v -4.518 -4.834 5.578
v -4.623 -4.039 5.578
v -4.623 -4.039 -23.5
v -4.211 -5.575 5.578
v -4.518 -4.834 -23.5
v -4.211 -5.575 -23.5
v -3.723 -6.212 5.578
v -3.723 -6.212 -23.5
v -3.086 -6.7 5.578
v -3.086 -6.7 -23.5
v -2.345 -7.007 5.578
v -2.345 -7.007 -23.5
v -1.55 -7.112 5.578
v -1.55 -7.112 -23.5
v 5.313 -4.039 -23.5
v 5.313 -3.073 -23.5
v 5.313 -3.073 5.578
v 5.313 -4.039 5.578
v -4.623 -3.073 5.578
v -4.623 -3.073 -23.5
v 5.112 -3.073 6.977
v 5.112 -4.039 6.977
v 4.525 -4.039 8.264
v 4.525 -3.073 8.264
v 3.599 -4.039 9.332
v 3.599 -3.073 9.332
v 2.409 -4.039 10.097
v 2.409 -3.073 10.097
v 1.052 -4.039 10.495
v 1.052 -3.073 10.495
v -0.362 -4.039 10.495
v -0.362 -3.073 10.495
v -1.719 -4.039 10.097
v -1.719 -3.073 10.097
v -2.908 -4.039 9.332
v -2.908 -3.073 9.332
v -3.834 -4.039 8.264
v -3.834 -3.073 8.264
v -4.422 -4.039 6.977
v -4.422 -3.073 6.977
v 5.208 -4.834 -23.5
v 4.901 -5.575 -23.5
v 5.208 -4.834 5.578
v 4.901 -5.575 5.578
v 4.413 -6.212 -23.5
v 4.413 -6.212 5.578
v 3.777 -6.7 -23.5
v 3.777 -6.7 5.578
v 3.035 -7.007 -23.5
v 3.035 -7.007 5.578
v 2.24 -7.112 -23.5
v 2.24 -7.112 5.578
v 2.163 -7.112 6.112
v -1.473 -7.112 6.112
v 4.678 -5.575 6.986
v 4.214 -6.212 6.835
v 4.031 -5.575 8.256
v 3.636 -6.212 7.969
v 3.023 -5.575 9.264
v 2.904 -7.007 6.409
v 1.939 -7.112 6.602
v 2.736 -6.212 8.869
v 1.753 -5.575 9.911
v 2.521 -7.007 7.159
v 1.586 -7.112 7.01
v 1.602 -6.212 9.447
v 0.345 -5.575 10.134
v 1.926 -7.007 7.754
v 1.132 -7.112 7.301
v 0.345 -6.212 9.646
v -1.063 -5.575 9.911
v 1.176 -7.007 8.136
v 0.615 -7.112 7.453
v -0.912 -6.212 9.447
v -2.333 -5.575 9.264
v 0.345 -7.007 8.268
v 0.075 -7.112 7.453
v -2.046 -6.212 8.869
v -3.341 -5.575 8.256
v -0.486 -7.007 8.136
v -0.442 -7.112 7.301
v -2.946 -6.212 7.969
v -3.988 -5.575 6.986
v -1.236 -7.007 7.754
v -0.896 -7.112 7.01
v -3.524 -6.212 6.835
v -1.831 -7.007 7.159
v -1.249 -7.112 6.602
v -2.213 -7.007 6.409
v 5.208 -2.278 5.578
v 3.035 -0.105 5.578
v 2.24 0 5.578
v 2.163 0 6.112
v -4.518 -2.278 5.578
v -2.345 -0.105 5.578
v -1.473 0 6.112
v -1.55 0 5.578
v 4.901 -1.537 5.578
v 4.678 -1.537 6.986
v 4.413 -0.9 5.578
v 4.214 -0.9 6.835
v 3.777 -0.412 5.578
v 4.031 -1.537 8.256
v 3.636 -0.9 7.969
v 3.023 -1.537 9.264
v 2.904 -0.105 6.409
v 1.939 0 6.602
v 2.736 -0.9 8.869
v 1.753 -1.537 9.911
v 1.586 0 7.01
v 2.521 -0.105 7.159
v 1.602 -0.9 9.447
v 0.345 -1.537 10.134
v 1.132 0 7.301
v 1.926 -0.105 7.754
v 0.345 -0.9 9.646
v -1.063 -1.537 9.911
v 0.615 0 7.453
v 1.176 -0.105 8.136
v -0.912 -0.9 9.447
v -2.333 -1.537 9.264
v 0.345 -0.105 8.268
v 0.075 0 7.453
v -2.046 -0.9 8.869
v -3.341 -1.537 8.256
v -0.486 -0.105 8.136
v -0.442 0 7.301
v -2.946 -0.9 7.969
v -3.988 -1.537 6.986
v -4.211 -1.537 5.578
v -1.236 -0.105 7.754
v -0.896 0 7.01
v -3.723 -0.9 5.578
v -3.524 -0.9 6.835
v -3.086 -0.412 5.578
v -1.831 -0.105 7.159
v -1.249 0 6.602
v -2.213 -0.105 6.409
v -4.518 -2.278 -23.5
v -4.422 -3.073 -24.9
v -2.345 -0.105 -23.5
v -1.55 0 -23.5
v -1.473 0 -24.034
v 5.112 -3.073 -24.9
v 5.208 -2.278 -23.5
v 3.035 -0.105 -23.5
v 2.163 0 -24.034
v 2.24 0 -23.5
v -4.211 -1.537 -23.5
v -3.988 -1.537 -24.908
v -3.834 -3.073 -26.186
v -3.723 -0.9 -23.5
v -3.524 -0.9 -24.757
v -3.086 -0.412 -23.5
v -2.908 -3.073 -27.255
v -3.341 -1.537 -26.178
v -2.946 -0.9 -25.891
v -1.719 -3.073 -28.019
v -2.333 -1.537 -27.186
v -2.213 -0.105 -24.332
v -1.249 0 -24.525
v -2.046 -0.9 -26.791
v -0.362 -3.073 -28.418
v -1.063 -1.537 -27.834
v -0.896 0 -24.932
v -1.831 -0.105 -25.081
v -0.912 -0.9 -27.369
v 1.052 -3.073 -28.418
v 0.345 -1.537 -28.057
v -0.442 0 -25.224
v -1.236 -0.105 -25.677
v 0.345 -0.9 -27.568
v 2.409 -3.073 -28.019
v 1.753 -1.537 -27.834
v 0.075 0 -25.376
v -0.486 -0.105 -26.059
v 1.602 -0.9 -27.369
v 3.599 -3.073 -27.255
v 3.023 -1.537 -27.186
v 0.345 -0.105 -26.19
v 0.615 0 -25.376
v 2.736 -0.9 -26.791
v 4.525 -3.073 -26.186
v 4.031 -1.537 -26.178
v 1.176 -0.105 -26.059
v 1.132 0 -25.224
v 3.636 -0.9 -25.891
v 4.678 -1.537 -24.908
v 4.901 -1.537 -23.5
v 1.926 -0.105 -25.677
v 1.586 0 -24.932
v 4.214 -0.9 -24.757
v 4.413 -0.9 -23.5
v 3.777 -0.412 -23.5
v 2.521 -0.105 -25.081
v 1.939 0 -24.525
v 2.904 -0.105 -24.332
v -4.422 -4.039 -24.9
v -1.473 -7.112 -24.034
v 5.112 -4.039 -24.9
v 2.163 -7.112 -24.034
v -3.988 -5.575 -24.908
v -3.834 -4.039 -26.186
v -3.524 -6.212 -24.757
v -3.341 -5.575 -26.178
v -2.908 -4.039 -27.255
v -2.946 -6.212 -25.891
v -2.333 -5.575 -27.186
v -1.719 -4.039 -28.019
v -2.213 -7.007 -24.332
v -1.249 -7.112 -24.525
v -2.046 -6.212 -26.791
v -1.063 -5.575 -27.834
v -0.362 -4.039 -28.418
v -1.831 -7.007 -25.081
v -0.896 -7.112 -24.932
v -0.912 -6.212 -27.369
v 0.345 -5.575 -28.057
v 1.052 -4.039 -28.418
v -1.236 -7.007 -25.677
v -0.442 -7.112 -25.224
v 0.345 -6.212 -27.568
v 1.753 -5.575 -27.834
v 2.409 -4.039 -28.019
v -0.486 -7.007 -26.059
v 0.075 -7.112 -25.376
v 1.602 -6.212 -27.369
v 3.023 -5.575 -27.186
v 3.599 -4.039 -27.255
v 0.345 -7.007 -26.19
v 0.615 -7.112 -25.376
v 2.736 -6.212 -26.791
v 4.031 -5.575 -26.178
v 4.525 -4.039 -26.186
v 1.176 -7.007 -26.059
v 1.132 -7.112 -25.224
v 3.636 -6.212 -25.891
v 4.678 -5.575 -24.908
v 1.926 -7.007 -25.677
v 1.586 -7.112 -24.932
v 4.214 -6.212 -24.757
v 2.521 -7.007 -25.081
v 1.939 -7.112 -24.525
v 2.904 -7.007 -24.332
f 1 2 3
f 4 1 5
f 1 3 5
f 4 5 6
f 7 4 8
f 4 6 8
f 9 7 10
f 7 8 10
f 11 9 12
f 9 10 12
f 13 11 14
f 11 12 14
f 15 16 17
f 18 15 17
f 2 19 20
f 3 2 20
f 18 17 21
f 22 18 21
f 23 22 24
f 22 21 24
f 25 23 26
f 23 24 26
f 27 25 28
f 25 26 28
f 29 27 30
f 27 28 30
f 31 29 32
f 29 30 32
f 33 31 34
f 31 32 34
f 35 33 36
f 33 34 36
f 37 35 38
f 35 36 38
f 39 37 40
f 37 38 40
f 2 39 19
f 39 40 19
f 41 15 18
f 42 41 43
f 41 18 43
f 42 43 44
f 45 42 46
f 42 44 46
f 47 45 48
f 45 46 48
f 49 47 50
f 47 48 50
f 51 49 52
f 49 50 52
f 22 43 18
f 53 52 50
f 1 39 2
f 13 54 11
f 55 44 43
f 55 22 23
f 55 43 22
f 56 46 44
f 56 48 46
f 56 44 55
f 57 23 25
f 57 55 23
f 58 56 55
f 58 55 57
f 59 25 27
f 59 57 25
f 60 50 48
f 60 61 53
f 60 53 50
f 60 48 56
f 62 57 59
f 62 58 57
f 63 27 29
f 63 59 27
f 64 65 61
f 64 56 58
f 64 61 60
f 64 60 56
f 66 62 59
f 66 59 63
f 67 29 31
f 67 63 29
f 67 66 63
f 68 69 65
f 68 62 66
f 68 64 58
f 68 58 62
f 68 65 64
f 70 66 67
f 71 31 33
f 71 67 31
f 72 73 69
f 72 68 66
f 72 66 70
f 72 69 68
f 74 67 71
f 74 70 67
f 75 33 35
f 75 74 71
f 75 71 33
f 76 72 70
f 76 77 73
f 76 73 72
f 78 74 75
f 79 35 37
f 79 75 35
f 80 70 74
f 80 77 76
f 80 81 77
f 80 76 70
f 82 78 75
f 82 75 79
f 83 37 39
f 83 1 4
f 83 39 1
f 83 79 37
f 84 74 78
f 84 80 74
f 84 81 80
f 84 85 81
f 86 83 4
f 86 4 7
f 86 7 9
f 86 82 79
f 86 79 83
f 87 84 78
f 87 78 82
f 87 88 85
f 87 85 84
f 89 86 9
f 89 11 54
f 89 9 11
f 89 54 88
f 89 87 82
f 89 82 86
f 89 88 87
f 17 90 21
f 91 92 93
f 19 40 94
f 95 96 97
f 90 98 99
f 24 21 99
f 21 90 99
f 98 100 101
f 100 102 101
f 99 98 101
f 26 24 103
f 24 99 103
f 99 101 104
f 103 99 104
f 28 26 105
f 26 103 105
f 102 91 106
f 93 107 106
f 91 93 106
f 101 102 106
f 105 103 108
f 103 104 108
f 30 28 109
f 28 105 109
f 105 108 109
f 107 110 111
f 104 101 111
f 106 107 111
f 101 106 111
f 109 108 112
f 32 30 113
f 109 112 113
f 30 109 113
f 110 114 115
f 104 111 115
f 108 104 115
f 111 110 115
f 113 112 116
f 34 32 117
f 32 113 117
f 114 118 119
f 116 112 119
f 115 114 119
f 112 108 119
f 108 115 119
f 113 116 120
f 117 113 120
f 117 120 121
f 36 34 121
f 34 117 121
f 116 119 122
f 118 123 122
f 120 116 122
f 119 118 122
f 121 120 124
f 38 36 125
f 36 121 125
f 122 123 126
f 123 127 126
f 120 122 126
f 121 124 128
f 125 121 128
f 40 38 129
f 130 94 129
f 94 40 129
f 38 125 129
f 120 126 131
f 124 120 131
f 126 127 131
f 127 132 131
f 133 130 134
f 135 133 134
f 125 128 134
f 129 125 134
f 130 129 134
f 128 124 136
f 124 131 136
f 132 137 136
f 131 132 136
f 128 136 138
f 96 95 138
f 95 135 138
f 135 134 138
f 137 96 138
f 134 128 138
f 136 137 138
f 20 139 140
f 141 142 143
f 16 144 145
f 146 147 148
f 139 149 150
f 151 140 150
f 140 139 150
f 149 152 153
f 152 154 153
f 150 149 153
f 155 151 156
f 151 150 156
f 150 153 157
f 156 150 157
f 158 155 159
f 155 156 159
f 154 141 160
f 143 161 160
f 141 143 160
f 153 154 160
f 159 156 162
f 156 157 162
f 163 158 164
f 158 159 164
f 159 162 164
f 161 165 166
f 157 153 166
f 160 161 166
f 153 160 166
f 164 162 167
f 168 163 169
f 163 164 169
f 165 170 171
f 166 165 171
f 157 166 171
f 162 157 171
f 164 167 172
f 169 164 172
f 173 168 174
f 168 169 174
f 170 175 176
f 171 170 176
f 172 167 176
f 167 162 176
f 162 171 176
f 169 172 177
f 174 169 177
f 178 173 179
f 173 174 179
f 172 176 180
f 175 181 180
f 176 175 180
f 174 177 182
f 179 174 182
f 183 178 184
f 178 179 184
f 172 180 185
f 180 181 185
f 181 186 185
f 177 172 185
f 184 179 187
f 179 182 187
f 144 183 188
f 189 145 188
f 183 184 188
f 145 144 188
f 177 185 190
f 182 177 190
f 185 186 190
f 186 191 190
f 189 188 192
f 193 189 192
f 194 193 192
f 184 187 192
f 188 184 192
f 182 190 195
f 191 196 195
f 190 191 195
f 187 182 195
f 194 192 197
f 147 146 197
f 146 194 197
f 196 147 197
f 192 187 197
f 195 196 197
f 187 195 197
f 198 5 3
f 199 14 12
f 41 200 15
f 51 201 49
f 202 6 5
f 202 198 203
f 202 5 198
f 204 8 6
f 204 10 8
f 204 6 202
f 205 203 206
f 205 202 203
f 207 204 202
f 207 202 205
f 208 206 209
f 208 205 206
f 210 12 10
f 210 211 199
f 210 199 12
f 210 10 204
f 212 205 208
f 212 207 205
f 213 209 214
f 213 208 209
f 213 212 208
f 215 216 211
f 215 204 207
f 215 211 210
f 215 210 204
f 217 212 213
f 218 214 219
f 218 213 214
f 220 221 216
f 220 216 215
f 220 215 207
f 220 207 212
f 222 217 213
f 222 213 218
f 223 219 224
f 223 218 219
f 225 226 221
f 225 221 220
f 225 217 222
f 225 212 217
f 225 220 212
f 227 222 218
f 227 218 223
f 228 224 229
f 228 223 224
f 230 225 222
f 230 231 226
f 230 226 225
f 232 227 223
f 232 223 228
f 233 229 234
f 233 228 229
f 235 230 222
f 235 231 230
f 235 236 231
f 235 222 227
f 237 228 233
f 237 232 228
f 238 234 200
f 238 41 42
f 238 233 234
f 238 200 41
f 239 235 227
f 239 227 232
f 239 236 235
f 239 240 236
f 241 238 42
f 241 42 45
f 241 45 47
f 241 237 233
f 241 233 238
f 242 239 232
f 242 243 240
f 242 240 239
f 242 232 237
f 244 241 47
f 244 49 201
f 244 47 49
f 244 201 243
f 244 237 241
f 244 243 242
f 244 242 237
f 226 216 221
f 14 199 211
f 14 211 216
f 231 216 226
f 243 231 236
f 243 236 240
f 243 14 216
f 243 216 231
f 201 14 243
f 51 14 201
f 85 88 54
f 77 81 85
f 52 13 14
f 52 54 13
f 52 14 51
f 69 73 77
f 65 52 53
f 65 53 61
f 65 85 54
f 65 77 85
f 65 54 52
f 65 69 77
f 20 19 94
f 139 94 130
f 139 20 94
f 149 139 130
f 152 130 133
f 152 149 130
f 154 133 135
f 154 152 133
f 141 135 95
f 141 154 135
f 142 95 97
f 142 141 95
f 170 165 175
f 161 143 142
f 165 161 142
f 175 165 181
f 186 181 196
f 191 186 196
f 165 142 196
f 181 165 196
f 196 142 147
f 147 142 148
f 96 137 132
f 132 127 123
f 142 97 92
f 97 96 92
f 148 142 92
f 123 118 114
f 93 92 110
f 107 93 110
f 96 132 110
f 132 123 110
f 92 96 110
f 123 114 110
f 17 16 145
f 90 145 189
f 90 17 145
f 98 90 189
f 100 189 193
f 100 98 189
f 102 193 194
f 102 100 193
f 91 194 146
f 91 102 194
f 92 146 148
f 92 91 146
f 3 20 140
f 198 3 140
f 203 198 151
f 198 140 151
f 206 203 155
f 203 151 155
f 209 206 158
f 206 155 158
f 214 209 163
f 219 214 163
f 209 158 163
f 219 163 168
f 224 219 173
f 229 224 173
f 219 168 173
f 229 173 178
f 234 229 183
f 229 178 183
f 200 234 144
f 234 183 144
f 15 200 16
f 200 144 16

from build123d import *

# Parameters (mm, degrees)
F1_DEPTH = 7.112
F2_R     = 3.0734


with BuildPart() as f1:
    # F0 (on Front) → F1 (new body)
    with BuildSketch(Plane.XZ):
        with BuildLine():
            ThreePointArc((-4.623045, -4.602544), (0.345085, 0.365587), (5.313216, -4.602544))
            Line((5.313216, -4.602544), (5.313216, 5.577769))
            ThreePointArc((5.313216, 5.577769), (0.345085, 10.5459), (-4.623045, 5.577769))
            Line((-4.623045, 5.577769), (-4.623045, 2.380263))
            Line((-4.623045, 2.380263), (-4.623045, -4.602544))
        make_face()
        with BuildLine():
            ThreePointArc((-4.623045, -4.602544), (0.345085, -9.570675), (5.313216, -4.602544))
            Line((5.313216, -4.602544), (-4.623045, -4.602544))
        make_face()
        with BuildLine():
            Line((-4.623045, -4.602544), (5.313216, -4.602544))
            ThreePointArc((5.313216, -4.602544), (0.345085, 0.365587), (-4.623045, -4.602544))
        make_face()
        with BuildLine():
            ThreePointArc((-4.623045, -23.500242), (0.345085, -28.468372), (5.313216, -23.500242))
            Line((5.313216, -23.500242), (5.313216, -4.602544))
            ThreePointArc((5.313216, -4.602544), (0.345085, -9.570675), (-4.623045, -4.602544))
            Line((-4.623045, -4.602544), (-4.623045, -23.500242))
        make_face()
    extrude(amount=F1_DEPTH)

    # F2
    f2_edges = [f1.edges().sort_by_distance(p)[0] for p in [
        (5.313216, -7.112, -8.961236),
        (5.313216, 0, -8.961236),
        (0.345085, -7.112, 10.5459),
        (0.345085, 0, 10.5459),
        (0.345085, -7.112, -28.468372),
        (-4.623045, 0, -8.961236),
        (-4.623045, -7.112, -8.961236),
    ]]
    fillet(f2_edges, radius=F2_R)


solid = f1.part
